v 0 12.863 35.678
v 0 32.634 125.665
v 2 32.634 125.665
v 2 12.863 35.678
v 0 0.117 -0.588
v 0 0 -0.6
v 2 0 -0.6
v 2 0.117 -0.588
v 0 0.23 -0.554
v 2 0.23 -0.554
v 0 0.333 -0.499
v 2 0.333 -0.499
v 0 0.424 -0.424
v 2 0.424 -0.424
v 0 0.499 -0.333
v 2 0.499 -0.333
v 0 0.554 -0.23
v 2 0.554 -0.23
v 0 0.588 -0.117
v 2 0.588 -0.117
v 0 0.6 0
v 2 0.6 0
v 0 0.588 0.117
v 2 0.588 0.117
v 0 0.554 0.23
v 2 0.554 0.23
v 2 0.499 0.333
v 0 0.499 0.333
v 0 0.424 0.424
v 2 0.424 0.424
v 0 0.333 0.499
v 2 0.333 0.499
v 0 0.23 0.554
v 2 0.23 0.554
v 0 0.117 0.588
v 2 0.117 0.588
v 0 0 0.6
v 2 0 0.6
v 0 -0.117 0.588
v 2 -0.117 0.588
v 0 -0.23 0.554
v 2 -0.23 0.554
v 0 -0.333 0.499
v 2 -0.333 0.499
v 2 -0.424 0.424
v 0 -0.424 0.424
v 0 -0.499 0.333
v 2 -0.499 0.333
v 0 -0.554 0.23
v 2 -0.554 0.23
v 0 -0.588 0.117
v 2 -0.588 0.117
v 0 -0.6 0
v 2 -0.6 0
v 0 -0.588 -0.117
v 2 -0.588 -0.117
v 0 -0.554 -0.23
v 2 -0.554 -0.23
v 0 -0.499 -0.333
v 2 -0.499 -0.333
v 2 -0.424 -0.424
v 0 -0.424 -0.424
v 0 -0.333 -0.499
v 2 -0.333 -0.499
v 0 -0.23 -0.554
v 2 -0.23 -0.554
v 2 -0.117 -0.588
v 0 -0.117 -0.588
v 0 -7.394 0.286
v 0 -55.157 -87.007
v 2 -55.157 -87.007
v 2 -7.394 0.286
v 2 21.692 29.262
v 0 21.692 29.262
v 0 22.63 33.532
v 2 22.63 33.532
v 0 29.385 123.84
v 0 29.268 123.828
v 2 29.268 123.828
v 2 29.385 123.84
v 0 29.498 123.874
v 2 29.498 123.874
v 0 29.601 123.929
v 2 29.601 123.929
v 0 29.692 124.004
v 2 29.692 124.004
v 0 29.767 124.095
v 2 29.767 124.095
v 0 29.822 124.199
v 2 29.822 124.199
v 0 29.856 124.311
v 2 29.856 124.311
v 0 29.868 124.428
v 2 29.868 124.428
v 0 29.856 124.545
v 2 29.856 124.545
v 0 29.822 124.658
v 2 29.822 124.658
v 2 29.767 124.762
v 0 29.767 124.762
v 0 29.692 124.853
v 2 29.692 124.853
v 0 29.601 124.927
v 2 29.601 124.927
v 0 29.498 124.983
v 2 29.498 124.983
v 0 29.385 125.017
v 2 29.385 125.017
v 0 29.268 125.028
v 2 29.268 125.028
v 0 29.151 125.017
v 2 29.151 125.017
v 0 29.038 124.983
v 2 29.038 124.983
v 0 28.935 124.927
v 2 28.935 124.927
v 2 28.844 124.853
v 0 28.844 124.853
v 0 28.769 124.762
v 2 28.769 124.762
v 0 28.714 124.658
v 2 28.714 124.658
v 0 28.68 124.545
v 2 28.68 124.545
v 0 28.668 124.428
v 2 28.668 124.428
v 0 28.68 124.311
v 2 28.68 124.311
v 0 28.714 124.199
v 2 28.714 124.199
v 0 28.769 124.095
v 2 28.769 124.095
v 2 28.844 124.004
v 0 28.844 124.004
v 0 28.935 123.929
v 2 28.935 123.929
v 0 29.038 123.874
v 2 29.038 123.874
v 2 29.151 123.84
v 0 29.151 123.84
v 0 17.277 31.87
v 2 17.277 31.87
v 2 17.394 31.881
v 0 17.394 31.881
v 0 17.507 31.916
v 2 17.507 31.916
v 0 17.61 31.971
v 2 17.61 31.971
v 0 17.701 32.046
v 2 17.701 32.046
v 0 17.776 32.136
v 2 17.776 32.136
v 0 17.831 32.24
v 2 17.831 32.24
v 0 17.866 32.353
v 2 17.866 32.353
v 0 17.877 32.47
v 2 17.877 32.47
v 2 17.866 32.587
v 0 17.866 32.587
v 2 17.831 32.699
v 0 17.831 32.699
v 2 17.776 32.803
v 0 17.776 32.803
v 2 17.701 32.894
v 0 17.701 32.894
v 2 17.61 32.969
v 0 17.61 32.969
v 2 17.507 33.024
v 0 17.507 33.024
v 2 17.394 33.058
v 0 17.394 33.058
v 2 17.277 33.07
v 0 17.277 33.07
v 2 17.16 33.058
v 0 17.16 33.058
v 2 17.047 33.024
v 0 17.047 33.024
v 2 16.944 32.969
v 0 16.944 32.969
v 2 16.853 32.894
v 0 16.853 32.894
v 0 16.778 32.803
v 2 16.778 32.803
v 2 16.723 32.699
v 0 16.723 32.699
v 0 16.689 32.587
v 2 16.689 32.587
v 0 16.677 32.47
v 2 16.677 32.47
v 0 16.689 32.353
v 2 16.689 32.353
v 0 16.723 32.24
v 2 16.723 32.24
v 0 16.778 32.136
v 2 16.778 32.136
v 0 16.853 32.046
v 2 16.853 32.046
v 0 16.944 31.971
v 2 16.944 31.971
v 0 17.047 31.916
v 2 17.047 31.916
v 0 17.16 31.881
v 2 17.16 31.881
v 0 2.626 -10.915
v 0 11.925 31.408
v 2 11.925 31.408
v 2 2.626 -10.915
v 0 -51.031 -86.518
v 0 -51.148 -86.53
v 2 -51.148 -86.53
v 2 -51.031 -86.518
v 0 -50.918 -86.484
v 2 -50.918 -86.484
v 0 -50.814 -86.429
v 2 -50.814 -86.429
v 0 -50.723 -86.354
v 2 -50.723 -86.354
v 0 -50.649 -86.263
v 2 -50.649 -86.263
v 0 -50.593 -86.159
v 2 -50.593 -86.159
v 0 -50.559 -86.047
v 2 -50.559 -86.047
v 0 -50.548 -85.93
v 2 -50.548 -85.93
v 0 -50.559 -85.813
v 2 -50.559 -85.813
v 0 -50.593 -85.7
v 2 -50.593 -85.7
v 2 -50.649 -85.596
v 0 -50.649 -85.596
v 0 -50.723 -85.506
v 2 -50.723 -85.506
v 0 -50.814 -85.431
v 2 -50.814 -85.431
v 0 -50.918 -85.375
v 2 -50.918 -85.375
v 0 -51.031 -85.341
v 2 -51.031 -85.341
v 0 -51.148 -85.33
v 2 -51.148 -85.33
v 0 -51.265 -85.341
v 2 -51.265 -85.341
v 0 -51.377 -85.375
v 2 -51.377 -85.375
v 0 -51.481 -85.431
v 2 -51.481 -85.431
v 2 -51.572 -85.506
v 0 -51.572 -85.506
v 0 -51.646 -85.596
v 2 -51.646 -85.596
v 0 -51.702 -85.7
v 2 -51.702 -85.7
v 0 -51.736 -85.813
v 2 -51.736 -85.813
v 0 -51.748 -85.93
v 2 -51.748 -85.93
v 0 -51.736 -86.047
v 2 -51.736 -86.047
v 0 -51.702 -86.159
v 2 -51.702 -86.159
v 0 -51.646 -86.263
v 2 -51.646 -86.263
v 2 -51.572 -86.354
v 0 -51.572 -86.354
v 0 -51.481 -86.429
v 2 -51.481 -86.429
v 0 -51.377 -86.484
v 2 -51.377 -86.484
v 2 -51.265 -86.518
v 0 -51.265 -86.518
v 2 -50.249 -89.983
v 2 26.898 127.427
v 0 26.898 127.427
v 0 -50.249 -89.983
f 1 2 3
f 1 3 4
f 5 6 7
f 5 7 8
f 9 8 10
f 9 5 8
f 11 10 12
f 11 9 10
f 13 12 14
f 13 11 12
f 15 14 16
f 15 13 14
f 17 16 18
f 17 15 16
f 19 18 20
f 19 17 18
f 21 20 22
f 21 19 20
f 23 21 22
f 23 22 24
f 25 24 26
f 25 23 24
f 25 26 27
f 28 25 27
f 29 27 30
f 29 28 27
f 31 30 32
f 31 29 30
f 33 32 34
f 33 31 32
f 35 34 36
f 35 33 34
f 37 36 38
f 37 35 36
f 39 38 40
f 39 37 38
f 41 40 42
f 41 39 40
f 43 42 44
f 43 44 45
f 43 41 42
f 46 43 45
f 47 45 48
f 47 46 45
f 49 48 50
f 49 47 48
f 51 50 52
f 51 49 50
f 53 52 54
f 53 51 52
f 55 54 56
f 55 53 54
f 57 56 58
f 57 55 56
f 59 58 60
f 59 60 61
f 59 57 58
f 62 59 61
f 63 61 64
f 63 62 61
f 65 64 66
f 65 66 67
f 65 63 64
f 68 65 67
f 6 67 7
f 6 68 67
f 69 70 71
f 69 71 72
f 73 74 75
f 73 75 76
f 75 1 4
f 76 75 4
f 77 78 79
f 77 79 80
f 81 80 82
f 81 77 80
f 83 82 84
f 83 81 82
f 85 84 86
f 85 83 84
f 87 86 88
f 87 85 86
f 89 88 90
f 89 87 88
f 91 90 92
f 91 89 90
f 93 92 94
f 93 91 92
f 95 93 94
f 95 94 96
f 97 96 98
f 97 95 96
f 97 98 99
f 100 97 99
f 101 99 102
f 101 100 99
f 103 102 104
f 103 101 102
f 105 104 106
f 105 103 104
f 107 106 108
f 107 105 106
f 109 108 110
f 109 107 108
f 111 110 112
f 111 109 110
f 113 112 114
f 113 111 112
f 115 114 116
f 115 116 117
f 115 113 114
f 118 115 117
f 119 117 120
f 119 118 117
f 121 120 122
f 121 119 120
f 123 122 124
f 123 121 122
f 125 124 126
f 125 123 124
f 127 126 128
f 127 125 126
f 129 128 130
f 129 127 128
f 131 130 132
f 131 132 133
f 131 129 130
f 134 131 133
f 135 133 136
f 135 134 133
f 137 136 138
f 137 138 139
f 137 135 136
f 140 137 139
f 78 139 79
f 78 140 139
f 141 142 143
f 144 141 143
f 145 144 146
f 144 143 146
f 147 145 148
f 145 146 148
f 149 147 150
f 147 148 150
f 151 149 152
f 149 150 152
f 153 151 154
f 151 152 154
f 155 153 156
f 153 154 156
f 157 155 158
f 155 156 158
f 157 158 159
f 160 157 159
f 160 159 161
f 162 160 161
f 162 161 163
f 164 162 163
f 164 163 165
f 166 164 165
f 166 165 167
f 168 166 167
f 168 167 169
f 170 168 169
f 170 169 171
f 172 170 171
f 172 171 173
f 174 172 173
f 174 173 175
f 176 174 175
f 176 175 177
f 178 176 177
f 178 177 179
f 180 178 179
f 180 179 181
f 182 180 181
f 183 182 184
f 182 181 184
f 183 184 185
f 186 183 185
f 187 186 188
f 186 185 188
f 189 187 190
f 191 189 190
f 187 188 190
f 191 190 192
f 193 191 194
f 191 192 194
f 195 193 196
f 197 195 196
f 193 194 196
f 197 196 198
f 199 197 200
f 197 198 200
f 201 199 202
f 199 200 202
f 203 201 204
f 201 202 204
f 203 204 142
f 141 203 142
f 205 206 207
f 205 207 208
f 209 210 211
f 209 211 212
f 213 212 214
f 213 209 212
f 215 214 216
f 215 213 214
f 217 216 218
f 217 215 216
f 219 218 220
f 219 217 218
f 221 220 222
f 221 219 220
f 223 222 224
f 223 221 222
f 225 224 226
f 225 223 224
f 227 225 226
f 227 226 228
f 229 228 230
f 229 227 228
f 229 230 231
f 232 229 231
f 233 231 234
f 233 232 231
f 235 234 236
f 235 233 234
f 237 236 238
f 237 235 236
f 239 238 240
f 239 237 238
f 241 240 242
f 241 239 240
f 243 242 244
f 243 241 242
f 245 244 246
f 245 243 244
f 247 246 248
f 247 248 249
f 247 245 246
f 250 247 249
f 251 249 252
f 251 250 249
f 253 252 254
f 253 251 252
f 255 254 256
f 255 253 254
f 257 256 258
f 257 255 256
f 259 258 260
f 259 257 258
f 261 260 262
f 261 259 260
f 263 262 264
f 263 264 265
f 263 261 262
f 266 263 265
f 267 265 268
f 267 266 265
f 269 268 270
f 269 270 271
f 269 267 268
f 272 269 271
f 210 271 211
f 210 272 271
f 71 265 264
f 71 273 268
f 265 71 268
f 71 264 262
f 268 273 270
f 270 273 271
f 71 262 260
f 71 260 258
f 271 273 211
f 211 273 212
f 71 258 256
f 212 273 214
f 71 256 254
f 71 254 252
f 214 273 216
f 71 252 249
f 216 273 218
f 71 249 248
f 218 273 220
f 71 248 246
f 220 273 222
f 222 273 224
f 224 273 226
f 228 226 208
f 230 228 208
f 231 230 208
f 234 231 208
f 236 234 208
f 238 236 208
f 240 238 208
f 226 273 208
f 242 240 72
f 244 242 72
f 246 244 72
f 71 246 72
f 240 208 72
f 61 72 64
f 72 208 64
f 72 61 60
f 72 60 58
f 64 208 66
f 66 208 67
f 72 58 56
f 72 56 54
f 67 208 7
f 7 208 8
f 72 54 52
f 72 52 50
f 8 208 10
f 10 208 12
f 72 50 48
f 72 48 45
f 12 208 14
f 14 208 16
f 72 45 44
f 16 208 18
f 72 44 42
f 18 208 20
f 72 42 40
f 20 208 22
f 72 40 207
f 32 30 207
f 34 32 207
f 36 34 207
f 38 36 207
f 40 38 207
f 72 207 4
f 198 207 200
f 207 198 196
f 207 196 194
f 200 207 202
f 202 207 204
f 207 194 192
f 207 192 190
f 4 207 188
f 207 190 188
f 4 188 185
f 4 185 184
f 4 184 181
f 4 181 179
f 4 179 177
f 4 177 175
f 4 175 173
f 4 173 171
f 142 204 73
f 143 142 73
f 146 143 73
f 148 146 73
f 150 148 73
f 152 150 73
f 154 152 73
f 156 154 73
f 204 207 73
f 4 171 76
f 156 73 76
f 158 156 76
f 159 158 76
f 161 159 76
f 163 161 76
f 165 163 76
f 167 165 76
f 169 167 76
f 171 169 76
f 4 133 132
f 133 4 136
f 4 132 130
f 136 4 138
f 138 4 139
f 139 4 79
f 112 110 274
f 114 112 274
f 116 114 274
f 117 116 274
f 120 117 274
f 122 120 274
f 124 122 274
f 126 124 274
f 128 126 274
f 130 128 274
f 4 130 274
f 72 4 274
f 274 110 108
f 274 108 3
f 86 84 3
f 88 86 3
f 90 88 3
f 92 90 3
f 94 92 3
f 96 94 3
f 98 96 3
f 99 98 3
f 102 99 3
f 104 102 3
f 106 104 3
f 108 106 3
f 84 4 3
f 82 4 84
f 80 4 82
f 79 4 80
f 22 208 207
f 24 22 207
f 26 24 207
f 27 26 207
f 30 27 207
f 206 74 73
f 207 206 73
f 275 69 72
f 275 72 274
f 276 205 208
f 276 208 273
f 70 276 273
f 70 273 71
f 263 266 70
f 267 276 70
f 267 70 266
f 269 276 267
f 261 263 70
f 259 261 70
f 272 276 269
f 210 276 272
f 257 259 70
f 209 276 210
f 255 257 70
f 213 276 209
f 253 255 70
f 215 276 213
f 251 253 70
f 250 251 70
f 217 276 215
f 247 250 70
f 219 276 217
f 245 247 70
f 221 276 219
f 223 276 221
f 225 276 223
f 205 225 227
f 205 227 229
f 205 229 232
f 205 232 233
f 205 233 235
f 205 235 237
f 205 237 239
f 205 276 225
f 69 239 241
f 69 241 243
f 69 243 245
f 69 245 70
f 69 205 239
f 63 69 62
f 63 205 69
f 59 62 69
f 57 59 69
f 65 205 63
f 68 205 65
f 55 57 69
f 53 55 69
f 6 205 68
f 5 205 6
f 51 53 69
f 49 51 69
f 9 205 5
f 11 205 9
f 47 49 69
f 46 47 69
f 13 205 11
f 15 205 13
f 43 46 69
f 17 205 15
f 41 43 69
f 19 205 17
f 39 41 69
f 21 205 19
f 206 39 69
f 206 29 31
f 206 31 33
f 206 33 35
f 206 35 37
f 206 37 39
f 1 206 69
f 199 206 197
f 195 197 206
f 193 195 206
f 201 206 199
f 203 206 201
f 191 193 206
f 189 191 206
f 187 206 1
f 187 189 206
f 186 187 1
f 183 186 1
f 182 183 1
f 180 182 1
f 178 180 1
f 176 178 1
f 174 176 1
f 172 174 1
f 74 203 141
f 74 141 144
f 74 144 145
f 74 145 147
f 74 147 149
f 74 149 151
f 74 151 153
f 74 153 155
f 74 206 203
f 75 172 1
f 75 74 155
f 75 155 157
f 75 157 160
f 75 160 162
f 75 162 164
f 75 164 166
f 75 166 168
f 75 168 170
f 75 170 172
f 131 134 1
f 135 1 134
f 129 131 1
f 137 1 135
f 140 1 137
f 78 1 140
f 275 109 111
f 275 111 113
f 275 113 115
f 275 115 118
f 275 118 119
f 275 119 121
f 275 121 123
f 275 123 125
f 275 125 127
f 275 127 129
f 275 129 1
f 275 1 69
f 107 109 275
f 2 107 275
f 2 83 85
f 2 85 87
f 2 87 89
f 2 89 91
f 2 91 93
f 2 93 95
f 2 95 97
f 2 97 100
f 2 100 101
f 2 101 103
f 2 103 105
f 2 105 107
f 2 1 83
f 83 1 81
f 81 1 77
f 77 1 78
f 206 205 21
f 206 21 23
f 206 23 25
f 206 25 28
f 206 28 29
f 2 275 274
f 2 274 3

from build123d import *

# Parameters (mm, degrees)
SKETCH_1_R          = 0.6
EXTRUDE_1_DEPTH     = 2
SKETCH_2_W          = 2
SKETCH_2_H          = 4.371689855
EXTRUDE_2_DEPTH     = 10
SKETCH_3_R          = 0.6
CUT_EXTRUDE_1_DEPTH = 139.866853183


with BuildPart() as part:
    # 草图1 → 凸台-拉伸1 (new body)
    with BuildSketch(Plane(origin=(0, 0, 0), x_dir=(0, 0, -1), z_dir=(1, 0, 0))):
        Polygon((-125.665306235, 32.633935399), (10.915414504, 2.625615762), (89.98290861, -50.249012451), (87.007289875, -55.156822928), (-0.286231168, -7.394028573), (-127.427343209, 26.898499434), align=None)
        Circle(SKETCH_1_R, mode=Mode.SUBTRACT)
        with Locations((85.929781066, -51.147558357)):
            Circle(SKETCH_1_R, mode=Mode.SUBTRACT)
        with Locations((-124.4283455, 29.268026496)):
            Circle(SKETCH_1_R, mode=Mode.SUBTRACT)
    extrude(amount=EXTRUDE_1_DEPTH)

    # 草图2 → 凸台-拉伸2 (add)
    with BuildSketch(Plane(origin=(0, 4.792506233, -1.052967491), x_dir=(1, 0, 0), z_dir=(0, 0.9767036122693339, -0.21459276264598237))):
        with Locations((1, -35.420952271)):
            Rectangle(SKETCH_2_W, SKETCH_2_H)
    extrude(amount=EXTRUDE_2_DEPTH)

    # 草图3 → 切除-拉伸1 (cut, through all)
    with BuildSketch(Plane(origin=(2, 0, 0), x_dir=(0, 0, -1), z_dir=(1, 0, 0))):
        with Locations((-32.469840729, 17.277104298)):
            Circle(SKETCH_3_R)
    extrude(amount=-CUT_EXTRUDE_1_DEPTH, mode=Mode.SUBTRACT)


solid = part.part
